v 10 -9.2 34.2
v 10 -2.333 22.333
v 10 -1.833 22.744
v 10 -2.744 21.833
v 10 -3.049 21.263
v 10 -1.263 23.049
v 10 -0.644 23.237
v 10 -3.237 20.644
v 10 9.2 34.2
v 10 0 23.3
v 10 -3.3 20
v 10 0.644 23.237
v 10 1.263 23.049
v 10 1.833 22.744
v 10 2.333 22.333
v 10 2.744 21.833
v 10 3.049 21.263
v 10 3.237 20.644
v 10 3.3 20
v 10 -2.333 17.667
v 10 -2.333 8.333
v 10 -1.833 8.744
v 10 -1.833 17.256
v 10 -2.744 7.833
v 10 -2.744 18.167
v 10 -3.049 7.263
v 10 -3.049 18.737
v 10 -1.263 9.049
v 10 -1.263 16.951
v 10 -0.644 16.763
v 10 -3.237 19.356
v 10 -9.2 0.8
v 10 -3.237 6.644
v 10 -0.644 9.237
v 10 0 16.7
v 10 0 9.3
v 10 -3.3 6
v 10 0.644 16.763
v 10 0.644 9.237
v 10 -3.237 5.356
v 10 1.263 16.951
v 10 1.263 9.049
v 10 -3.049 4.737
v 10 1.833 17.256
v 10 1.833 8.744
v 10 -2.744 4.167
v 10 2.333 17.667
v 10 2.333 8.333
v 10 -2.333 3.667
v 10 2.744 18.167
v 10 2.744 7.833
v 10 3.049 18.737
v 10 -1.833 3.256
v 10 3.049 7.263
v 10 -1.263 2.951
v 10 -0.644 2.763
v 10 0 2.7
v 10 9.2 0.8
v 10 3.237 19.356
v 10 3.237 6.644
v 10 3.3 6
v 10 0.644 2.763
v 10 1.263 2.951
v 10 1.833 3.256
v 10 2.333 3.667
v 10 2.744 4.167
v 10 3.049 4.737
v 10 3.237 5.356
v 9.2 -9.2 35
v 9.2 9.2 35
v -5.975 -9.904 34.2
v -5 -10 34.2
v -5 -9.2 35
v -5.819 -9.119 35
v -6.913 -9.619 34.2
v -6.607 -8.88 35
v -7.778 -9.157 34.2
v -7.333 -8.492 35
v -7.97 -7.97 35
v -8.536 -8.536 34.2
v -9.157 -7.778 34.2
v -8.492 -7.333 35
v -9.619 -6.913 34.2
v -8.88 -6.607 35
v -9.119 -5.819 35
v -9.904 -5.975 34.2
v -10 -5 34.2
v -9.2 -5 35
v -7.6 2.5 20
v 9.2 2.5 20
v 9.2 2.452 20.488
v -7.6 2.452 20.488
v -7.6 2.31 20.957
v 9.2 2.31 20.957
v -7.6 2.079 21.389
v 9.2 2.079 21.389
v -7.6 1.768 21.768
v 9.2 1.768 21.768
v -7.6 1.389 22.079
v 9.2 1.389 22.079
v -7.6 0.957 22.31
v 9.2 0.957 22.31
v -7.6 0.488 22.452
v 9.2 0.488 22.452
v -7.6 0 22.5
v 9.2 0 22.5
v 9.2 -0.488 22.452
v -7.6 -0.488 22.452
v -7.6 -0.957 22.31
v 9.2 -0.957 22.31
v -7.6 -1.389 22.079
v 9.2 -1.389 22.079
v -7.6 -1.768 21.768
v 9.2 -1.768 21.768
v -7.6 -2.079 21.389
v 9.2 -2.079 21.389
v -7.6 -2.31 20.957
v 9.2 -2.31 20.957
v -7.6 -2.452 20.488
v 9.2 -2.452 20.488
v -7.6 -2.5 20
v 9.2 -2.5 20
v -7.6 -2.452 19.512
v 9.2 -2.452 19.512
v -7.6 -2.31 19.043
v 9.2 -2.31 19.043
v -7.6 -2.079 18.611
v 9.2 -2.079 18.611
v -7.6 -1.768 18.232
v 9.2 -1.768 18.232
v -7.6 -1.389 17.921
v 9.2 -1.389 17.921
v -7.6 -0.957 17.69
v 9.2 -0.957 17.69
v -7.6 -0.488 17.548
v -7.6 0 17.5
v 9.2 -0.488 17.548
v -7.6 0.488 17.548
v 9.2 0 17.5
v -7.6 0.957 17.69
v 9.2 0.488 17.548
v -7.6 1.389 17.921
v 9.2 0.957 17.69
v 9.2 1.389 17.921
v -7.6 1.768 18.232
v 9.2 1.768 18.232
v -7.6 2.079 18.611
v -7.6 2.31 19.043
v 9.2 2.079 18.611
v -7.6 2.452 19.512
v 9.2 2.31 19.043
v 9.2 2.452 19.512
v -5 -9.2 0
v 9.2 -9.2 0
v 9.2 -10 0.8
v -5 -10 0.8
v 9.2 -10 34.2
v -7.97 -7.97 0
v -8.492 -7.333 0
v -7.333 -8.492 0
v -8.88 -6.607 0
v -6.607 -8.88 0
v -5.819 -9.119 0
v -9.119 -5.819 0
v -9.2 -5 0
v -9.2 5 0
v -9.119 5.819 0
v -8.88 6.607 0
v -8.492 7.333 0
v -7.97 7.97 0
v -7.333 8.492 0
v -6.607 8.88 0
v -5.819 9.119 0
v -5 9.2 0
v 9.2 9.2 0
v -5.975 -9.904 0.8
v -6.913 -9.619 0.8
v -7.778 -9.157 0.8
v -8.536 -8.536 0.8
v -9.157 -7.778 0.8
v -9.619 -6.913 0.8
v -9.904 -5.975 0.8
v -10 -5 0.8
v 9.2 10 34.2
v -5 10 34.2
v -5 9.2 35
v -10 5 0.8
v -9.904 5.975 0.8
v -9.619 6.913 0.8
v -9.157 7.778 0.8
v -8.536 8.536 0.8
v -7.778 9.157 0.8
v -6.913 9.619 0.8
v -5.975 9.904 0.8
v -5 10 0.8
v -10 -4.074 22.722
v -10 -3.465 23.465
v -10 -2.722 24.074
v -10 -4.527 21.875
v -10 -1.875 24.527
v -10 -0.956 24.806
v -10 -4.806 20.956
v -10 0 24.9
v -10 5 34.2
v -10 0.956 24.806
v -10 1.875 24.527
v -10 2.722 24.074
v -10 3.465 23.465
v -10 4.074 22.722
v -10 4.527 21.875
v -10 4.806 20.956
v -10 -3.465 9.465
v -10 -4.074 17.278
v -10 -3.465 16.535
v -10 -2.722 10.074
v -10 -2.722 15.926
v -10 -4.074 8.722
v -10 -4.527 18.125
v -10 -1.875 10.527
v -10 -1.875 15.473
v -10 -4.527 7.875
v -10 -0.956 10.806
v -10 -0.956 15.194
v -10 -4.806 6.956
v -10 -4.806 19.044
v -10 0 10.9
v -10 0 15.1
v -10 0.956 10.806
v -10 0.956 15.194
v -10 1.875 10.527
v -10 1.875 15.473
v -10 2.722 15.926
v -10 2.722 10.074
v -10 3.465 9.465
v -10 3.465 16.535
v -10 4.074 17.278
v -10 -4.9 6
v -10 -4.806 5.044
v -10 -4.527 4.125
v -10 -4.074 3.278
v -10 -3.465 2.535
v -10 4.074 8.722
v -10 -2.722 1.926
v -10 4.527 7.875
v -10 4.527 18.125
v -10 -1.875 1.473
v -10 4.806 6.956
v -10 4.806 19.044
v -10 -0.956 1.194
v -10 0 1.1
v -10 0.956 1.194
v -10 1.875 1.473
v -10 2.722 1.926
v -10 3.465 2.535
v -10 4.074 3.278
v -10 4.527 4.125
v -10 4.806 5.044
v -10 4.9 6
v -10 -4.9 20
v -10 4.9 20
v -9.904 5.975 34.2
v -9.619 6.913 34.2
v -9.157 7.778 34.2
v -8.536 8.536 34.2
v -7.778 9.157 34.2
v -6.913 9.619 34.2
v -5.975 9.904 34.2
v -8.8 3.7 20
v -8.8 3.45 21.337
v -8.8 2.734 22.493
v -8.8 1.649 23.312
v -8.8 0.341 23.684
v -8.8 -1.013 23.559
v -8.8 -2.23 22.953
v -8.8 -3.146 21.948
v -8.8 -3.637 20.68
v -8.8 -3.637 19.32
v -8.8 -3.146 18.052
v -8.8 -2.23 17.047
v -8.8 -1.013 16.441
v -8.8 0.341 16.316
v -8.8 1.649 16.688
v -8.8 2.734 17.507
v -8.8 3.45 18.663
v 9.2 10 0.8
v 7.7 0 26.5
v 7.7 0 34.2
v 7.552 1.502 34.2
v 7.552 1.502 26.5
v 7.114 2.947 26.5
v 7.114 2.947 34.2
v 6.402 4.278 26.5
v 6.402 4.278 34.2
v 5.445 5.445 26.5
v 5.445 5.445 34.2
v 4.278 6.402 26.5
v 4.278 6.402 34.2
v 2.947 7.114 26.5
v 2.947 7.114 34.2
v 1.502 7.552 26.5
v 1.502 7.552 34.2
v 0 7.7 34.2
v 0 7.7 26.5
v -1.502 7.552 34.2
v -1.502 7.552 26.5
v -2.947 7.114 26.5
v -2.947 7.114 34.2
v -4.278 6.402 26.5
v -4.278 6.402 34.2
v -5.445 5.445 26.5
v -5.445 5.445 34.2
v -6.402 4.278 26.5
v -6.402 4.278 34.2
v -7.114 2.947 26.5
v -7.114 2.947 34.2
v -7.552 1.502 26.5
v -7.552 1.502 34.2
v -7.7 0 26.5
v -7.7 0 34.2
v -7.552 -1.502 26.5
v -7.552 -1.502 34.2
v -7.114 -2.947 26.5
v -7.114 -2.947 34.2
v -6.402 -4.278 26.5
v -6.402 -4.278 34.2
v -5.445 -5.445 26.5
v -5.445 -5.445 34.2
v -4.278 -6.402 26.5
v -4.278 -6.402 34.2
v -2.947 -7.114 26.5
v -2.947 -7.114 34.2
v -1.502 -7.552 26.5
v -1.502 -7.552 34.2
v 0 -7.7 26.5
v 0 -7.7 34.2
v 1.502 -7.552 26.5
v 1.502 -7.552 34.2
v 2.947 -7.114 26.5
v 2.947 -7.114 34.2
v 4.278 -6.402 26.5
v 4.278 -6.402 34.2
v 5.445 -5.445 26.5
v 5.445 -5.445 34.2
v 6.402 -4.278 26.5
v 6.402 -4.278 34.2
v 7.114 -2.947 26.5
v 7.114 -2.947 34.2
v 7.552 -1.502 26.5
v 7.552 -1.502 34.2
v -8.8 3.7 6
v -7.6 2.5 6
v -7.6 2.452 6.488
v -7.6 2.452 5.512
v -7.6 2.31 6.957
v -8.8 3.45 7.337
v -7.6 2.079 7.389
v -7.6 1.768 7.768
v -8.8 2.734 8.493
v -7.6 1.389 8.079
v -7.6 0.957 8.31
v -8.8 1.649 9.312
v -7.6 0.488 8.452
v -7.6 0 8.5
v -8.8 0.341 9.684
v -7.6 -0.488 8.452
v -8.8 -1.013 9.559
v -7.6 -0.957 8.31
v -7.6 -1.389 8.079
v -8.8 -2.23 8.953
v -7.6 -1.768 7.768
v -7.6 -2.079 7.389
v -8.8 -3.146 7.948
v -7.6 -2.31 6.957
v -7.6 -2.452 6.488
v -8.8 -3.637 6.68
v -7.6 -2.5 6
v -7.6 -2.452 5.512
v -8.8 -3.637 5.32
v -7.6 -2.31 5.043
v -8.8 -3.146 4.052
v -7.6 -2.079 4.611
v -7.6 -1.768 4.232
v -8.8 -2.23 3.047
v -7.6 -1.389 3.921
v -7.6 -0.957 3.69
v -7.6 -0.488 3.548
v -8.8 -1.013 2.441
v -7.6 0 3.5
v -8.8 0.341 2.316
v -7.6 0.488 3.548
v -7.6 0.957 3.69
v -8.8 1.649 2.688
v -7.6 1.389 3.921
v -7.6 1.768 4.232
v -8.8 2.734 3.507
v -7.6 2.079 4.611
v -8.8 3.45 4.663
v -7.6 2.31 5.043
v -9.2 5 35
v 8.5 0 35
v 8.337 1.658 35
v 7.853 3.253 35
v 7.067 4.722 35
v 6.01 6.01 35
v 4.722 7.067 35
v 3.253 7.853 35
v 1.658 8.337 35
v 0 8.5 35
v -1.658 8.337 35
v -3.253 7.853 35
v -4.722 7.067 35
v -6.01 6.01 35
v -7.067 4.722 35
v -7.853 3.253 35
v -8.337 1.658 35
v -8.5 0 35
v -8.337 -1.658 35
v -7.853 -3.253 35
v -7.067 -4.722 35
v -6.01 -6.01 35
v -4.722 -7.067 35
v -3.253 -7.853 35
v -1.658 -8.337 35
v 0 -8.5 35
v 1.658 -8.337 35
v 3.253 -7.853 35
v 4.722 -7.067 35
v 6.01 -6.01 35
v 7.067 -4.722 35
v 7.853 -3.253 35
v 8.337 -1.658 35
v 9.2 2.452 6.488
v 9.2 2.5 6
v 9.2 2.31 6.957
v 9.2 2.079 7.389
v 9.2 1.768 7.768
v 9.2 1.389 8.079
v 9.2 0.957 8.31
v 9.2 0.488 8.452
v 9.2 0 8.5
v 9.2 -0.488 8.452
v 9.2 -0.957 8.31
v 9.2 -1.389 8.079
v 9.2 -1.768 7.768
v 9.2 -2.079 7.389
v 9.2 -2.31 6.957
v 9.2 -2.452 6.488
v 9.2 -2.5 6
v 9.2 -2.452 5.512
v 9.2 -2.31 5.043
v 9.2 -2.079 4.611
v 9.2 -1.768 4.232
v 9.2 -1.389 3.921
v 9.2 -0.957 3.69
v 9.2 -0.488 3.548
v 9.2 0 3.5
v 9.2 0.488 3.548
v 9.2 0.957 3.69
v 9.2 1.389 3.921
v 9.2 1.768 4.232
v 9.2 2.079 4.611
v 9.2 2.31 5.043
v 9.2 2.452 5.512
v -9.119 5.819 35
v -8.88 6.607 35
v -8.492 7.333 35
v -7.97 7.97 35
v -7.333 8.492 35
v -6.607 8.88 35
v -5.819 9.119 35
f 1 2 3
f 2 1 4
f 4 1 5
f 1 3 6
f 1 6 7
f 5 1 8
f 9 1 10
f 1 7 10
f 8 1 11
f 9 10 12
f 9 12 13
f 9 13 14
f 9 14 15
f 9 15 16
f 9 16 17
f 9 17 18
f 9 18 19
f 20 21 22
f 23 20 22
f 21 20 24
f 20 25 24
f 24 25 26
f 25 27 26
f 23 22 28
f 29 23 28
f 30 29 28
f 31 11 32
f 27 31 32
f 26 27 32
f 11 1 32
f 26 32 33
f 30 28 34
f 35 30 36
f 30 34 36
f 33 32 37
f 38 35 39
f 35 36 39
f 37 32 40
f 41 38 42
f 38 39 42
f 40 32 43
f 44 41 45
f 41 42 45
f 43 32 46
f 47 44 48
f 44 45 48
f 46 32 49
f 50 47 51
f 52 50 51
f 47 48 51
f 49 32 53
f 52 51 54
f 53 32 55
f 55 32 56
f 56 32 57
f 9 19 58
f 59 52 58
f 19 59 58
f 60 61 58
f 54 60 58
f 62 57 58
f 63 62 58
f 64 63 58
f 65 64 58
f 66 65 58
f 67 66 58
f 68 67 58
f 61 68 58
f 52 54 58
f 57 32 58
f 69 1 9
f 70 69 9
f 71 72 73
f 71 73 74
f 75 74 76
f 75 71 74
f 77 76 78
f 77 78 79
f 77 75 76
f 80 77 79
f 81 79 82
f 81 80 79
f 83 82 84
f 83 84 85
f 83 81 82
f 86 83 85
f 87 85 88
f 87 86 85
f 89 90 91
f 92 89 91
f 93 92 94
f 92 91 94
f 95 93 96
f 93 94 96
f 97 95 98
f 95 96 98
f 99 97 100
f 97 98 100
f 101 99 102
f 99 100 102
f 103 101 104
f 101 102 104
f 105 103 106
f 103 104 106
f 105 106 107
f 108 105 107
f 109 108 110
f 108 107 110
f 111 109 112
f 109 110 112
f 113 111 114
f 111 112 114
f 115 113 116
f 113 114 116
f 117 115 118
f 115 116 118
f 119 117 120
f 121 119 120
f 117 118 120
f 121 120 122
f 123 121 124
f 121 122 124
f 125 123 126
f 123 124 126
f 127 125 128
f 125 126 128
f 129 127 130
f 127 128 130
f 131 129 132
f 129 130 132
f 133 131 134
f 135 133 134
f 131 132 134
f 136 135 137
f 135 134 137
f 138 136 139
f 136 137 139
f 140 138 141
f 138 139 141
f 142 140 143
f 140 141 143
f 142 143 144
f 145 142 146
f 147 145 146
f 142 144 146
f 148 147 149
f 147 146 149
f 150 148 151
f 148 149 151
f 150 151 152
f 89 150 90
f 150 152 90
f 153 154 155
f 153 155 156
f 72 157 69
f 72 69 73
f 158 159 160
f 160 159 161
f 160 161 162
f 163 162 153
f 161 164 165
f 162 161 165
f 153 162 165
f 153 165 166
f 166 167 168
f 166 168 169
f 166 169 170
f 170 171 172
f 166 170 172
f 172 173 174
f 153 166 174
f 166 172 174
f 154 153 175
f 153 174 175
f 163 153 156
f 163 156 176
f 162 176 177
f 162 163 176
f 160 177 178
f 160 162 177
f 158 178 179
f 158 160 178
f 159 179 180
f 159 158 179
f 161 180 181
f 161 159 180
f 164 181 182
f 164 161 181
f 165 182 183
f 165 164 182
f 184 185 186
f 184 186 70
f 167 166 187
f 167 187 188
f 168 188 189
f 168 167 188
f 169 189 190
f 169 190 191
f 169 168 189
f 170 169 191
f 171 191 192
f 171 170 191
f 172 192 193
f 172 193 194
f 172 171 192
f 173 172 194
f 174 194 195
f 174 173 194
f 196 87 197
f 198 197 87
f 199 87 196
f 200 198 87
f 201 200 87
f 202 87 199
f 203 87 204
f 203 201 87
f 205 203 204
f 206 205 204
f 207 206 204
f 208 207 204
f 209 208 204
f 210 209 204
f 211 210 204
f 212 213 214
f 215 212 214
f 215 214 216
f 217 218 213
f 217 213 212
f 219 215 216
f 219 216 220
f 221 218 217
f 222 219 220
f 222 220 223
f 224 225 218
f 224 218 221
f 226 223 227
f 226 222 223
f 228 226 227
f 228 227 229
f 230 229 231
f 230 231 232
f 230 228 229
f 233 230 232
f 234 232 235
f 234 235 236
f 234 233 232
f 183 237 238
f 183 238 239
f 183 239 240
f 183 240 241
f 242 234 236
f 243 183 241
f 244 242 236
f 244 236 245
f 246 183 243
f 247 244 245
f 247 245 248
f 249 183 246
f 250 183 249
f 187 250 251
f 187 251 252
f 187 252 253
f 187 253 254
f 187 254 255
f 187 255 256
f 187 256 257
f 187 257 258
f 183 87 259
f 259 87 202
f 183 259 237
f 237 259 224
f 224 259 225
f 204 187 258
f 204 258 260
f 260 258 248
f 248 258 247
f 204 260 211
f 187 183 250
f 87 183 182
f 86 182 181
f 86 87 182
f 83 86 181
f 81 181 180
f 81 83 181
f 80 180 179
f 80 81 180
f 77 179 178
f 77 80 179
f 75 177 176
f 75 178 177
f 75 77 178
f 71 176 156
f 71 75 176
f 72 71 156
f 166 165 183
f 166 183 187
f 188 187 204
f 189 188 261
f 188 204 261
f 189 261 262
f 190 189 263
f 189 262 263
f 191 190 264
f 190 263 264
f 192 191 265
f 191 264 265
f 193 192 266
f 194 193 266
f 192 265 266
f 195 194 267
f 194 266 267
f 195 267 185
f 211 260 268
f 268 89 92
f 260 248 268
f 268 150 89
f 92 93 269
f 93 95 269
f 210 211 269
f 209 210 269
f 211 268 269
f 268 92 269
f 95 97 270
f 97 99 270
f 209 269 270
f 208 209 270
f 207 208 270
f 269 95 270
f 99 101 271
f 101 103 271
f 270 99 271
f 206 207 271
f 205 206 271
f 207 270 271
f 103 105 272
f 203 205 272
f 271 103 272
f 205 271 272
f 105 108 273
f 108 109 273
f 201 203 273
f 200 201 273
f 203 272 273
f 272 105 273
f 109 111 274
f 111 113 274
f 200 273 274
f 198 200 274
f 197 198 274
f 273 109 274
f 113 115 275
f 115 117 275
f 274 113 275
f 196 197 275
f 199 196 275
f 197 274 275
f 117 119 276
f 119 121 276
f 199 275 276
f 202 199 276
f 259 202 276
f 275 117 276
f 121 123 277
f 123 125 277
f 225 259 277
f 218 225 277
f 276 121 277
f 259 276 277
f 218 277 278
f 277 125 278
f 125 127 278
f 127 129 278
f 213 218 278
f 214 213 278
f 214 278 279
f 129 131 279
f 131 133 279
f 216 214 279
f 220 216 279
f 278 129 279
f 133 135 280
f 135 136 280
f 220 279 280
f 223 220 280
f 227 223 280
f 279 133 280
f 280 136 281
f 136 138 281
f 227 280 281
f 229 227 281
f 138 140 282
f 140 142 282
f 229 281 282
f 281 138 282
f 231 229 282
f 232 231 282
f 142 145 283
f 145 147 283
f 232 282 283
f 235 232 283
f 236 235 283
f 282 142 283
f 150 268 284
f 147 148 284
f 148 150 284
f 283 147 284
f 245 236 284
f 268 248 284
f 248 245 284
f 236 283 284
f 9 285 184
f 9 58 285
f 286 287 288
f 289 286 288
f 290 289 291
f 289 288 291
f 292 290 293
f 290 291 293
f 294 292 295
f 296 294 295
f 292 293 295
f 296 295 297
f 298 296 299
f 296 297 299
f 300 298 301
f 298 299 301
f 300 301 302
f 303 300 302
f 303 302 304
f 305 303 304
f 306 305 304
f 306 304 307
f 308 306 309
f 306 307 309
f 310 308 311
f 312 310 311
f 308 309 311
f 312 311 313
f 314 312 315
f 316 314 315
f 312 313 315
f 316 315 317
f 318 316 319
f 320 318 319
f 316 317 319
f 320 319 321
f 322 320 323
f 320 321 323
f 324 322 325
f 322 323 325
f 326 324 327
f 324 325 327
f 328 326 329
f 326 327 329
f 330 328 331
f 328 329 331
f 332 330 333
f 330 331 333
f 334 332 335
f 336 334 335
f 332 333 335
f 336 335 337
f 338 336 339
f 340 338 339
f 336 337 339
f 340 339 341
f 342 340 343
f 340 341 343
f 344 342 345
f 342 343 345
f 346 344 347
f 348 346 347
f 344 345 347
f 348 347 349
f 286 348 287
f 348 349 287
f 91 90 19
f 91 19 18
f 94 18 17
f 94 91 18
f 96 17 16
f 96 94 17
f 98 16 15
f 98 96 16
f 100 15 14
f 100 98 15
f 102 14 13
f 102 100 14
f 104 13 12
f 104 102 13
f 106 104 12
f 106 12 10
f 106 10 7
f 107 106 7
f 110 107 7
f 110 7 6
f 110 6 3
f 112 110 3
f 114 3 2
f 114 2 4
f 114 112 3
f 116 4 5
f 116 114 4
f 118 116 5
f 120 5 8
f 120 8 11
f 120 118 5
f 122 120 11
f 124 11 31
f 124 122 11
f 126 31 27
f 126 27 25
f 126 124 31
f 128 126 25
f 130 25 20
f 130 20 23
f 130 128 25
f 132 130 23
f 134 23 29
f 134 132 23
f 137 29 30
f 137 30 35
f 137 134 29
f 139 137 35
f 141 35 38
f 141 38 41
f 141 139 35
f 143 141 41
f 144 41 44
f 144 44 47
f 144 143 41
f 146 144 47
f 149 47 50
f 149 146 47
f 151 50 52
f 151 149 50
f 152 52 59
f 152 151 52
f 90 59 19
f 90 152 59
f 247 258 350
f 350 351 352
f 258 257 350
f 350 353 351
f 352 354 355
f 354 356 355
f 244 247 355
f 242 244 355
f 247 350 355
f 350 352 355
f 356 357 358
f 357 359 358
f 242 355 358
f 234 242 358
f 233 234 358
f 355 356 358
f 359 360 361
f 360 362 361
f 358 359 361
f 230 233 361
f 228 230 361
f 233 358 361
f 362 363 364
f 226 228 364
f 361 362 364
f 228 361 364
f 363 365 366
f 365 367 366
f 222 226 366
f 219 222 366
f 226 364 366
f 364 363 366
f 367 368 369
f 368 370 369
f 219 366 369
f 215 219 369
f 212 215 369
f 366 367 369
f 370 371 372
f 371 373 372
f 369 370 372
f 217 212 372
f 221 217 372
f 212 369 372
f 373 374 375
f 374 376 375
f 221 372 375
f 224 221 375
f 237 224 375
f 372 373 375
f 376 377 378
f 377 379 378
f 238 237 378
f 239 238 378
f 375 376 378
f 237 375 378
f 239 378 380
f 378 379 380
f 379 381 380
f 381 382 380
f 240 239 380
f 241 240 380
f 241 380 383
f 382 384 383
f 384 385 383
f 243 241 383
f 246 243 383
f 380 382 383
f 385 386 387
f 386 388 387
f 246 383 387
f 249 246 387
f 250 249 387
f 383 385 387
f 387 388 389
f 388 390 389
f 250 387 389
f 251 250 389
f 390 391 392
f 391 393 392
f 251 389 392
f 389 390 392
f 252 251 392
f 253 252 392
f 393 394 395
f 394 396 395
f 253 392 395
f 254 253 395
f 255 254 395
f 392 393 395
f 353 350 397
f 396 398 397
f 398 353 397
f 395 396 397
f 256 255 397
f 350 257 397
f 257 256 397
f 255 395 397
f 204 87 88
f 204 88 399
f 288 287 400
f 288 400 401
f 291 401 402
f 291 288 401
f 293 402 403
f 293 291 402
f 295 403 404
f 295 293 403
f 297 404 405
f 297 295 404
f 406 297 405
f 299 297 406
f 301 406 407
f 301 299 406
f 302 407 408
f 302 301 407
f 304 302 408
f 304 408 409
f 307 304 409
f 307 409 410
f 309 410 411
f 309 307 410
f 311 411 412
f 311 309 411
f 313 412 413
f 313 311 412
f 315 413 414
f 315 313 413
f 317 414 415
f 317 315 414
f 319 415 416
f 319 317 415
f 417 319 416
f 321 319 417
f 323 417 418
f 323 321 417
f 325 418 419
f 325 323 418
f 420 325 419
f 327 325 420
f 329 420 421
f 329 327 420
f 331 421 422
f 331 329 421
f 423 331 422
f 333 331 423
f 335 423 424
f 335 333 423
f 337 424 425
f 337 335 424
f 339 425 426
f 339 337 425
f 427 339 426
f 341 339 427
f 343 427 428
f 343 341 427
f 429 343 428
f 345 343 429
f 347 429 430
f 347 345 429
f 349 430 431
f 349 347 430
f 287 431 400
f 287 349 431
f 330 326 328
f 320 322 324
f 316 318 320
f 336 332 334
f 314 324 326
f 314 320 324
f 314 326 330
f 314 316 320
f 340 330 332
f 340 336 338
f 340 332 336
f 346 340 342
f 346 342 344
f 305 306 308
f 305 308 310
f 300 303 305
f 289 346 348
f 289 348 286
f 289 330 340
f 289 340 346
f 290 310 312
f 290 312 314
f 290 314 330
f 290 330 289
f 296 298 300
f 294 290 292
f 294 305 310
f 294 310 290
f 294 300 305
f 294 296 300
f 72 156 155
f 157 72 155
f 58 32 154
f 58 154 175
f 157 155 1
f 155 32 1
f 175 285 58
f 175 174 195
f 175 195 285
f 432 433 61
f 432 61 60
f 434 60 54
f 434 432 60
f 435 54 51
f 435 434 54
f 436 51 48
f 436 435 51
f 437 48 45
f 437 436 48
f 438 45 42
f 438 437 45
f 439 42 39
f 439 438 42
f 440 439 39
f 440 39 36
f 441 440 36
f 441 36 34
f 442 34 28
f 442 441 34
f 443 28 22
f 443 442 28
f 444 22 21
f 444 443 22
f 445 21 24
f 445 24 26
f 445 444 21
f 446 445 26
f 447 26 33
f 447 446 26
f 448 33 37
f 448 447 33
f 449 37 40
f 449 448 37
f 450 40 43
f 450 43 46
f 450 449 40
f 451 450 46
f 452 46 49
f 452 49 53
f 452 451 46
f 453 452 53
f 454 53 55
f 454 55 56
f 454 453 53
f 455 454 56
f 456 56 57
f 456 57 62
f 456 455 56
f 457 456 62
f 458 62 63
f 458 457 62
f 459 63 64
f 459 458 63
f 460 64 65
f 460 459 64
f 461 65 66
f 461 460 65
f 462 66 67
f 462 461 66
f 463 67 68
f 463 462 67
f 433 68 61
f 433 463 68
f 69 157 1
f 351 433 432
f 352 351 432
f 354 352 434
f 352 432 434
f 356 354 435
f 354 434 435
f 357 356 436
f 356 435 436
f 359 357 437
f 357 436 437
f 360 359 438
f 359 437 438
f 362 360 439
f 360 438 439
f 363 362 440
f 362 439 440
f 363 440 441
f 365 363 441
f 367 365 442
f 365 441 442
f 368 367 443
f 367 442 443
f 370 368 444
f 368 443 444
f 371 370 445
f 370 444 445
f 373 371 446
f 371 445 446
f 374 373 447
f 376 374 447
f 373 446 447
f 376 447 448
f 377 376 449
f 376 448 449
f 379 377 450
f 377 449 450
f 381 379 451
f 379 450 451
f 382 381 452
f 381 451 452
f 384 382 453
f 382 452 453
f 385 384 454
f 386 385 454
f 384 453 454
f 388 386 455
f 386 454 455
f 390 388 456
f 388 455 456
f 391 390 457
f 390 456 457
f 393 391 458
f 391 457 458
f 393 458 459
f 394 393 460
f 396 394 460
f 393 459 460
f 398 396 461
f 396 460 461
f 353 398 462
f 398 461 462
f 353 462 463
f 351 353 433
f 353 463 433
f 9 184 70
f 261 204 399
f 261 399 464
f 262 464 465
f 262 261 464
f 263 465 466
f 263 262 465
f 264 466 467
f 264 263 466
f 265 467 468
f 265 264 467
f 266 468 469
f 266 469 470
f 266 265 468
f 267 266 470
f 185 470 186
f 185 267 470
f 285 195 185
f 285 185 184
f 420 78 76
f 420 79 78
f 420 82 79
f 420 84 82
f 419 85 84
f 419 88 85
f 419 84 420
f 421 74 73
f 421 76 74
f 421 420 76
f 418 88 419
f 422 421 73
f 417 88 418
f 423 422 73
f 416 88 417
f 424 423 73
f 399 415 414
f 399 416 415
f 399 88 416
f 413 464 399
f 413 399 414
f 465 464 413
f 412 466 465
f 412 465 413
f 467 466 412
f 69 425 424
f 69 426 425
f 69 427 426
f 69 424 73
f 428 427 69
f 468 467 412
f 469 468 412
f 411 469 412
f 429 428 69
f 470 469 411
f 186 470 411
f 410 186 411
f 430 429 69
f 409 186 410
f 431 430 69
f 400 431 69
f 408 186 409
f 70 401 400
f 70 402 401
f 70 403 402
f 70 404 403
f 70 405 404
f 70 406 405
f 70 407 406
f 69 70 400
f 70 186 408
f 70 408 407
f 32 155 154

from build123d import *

# Parameters (mm, degrees)
F0_W           = 20
F0_H           = 20
F1_DEPTH       = 35
F2_R           = 7.7
F3_DEPTH       = 8.5
F5_D           = 5
F5_CSINK_D     = 9.8
F5_CSINK_ANGLE = 90
F6_R           = 5
F7_SIZE        = 0.8


with BuildPart() as f1:
    # F0 (on Top) → F1 (new body)
    with BuildSketch(Plane.XY):
        Rectangle(F0_W, F0_H)
    extrude(amount=F1_DEPTH)

    # F2 (on face) → F3 (cut)
    with BuildSketch(Plane.XY.offset(35)):
        Circle(F2_R)
    extrude(amount=-F3_DEPTH, mode=Mode.SUBTRACT)

    # F5 (through all)
    with Locations(Plane(origin=(-10, 0, 0), x_dir=(0, -1, 0), z_dir=(-1, 0, 0))):
        with Locations((0, 6), (0, 20)):
            CounterSinkHole(F5_D / 2, F5_CSINK_D / 2, counter_sink_angle=F5_CSINK_ANGLE)

    # F6
    f6_edges = [f1.edges().sort_by_distance(p)[0] for p in [
        (-10, -10, 17.5),
        (-10, 10, 17.5),
    ]]
    fillet(f6_edges, radius=F6_R)

    # F7
    f7_edges = [f1.edges().sort_by_distance(p)[0] for p in [
        (-7.7, 0, 35),
        (10, -10, 17.5),
        (10, 10, 17.5),
        (2.5, 10, 35),
        (-10, 0, 35),
        (10, 0, 35),
        (-10, 0, 0),
        (2.5, 10, 0),
        (10, 0, 0),
        (2.5, -10, 0),
        (2.5, -10, 35),
        (-8.535534, -8.535534, 0),
        (-8.535534, 8.535534, 0),
        (-8.535534, -8.535534, 35),
        (10, 2.5, 20),
        (10, 2.5, 6),
        (-8.535534, 8.535534, 35),
    ]]
    chamfer(f7_edges, length=F7_SIZE)


solid = f1.part
